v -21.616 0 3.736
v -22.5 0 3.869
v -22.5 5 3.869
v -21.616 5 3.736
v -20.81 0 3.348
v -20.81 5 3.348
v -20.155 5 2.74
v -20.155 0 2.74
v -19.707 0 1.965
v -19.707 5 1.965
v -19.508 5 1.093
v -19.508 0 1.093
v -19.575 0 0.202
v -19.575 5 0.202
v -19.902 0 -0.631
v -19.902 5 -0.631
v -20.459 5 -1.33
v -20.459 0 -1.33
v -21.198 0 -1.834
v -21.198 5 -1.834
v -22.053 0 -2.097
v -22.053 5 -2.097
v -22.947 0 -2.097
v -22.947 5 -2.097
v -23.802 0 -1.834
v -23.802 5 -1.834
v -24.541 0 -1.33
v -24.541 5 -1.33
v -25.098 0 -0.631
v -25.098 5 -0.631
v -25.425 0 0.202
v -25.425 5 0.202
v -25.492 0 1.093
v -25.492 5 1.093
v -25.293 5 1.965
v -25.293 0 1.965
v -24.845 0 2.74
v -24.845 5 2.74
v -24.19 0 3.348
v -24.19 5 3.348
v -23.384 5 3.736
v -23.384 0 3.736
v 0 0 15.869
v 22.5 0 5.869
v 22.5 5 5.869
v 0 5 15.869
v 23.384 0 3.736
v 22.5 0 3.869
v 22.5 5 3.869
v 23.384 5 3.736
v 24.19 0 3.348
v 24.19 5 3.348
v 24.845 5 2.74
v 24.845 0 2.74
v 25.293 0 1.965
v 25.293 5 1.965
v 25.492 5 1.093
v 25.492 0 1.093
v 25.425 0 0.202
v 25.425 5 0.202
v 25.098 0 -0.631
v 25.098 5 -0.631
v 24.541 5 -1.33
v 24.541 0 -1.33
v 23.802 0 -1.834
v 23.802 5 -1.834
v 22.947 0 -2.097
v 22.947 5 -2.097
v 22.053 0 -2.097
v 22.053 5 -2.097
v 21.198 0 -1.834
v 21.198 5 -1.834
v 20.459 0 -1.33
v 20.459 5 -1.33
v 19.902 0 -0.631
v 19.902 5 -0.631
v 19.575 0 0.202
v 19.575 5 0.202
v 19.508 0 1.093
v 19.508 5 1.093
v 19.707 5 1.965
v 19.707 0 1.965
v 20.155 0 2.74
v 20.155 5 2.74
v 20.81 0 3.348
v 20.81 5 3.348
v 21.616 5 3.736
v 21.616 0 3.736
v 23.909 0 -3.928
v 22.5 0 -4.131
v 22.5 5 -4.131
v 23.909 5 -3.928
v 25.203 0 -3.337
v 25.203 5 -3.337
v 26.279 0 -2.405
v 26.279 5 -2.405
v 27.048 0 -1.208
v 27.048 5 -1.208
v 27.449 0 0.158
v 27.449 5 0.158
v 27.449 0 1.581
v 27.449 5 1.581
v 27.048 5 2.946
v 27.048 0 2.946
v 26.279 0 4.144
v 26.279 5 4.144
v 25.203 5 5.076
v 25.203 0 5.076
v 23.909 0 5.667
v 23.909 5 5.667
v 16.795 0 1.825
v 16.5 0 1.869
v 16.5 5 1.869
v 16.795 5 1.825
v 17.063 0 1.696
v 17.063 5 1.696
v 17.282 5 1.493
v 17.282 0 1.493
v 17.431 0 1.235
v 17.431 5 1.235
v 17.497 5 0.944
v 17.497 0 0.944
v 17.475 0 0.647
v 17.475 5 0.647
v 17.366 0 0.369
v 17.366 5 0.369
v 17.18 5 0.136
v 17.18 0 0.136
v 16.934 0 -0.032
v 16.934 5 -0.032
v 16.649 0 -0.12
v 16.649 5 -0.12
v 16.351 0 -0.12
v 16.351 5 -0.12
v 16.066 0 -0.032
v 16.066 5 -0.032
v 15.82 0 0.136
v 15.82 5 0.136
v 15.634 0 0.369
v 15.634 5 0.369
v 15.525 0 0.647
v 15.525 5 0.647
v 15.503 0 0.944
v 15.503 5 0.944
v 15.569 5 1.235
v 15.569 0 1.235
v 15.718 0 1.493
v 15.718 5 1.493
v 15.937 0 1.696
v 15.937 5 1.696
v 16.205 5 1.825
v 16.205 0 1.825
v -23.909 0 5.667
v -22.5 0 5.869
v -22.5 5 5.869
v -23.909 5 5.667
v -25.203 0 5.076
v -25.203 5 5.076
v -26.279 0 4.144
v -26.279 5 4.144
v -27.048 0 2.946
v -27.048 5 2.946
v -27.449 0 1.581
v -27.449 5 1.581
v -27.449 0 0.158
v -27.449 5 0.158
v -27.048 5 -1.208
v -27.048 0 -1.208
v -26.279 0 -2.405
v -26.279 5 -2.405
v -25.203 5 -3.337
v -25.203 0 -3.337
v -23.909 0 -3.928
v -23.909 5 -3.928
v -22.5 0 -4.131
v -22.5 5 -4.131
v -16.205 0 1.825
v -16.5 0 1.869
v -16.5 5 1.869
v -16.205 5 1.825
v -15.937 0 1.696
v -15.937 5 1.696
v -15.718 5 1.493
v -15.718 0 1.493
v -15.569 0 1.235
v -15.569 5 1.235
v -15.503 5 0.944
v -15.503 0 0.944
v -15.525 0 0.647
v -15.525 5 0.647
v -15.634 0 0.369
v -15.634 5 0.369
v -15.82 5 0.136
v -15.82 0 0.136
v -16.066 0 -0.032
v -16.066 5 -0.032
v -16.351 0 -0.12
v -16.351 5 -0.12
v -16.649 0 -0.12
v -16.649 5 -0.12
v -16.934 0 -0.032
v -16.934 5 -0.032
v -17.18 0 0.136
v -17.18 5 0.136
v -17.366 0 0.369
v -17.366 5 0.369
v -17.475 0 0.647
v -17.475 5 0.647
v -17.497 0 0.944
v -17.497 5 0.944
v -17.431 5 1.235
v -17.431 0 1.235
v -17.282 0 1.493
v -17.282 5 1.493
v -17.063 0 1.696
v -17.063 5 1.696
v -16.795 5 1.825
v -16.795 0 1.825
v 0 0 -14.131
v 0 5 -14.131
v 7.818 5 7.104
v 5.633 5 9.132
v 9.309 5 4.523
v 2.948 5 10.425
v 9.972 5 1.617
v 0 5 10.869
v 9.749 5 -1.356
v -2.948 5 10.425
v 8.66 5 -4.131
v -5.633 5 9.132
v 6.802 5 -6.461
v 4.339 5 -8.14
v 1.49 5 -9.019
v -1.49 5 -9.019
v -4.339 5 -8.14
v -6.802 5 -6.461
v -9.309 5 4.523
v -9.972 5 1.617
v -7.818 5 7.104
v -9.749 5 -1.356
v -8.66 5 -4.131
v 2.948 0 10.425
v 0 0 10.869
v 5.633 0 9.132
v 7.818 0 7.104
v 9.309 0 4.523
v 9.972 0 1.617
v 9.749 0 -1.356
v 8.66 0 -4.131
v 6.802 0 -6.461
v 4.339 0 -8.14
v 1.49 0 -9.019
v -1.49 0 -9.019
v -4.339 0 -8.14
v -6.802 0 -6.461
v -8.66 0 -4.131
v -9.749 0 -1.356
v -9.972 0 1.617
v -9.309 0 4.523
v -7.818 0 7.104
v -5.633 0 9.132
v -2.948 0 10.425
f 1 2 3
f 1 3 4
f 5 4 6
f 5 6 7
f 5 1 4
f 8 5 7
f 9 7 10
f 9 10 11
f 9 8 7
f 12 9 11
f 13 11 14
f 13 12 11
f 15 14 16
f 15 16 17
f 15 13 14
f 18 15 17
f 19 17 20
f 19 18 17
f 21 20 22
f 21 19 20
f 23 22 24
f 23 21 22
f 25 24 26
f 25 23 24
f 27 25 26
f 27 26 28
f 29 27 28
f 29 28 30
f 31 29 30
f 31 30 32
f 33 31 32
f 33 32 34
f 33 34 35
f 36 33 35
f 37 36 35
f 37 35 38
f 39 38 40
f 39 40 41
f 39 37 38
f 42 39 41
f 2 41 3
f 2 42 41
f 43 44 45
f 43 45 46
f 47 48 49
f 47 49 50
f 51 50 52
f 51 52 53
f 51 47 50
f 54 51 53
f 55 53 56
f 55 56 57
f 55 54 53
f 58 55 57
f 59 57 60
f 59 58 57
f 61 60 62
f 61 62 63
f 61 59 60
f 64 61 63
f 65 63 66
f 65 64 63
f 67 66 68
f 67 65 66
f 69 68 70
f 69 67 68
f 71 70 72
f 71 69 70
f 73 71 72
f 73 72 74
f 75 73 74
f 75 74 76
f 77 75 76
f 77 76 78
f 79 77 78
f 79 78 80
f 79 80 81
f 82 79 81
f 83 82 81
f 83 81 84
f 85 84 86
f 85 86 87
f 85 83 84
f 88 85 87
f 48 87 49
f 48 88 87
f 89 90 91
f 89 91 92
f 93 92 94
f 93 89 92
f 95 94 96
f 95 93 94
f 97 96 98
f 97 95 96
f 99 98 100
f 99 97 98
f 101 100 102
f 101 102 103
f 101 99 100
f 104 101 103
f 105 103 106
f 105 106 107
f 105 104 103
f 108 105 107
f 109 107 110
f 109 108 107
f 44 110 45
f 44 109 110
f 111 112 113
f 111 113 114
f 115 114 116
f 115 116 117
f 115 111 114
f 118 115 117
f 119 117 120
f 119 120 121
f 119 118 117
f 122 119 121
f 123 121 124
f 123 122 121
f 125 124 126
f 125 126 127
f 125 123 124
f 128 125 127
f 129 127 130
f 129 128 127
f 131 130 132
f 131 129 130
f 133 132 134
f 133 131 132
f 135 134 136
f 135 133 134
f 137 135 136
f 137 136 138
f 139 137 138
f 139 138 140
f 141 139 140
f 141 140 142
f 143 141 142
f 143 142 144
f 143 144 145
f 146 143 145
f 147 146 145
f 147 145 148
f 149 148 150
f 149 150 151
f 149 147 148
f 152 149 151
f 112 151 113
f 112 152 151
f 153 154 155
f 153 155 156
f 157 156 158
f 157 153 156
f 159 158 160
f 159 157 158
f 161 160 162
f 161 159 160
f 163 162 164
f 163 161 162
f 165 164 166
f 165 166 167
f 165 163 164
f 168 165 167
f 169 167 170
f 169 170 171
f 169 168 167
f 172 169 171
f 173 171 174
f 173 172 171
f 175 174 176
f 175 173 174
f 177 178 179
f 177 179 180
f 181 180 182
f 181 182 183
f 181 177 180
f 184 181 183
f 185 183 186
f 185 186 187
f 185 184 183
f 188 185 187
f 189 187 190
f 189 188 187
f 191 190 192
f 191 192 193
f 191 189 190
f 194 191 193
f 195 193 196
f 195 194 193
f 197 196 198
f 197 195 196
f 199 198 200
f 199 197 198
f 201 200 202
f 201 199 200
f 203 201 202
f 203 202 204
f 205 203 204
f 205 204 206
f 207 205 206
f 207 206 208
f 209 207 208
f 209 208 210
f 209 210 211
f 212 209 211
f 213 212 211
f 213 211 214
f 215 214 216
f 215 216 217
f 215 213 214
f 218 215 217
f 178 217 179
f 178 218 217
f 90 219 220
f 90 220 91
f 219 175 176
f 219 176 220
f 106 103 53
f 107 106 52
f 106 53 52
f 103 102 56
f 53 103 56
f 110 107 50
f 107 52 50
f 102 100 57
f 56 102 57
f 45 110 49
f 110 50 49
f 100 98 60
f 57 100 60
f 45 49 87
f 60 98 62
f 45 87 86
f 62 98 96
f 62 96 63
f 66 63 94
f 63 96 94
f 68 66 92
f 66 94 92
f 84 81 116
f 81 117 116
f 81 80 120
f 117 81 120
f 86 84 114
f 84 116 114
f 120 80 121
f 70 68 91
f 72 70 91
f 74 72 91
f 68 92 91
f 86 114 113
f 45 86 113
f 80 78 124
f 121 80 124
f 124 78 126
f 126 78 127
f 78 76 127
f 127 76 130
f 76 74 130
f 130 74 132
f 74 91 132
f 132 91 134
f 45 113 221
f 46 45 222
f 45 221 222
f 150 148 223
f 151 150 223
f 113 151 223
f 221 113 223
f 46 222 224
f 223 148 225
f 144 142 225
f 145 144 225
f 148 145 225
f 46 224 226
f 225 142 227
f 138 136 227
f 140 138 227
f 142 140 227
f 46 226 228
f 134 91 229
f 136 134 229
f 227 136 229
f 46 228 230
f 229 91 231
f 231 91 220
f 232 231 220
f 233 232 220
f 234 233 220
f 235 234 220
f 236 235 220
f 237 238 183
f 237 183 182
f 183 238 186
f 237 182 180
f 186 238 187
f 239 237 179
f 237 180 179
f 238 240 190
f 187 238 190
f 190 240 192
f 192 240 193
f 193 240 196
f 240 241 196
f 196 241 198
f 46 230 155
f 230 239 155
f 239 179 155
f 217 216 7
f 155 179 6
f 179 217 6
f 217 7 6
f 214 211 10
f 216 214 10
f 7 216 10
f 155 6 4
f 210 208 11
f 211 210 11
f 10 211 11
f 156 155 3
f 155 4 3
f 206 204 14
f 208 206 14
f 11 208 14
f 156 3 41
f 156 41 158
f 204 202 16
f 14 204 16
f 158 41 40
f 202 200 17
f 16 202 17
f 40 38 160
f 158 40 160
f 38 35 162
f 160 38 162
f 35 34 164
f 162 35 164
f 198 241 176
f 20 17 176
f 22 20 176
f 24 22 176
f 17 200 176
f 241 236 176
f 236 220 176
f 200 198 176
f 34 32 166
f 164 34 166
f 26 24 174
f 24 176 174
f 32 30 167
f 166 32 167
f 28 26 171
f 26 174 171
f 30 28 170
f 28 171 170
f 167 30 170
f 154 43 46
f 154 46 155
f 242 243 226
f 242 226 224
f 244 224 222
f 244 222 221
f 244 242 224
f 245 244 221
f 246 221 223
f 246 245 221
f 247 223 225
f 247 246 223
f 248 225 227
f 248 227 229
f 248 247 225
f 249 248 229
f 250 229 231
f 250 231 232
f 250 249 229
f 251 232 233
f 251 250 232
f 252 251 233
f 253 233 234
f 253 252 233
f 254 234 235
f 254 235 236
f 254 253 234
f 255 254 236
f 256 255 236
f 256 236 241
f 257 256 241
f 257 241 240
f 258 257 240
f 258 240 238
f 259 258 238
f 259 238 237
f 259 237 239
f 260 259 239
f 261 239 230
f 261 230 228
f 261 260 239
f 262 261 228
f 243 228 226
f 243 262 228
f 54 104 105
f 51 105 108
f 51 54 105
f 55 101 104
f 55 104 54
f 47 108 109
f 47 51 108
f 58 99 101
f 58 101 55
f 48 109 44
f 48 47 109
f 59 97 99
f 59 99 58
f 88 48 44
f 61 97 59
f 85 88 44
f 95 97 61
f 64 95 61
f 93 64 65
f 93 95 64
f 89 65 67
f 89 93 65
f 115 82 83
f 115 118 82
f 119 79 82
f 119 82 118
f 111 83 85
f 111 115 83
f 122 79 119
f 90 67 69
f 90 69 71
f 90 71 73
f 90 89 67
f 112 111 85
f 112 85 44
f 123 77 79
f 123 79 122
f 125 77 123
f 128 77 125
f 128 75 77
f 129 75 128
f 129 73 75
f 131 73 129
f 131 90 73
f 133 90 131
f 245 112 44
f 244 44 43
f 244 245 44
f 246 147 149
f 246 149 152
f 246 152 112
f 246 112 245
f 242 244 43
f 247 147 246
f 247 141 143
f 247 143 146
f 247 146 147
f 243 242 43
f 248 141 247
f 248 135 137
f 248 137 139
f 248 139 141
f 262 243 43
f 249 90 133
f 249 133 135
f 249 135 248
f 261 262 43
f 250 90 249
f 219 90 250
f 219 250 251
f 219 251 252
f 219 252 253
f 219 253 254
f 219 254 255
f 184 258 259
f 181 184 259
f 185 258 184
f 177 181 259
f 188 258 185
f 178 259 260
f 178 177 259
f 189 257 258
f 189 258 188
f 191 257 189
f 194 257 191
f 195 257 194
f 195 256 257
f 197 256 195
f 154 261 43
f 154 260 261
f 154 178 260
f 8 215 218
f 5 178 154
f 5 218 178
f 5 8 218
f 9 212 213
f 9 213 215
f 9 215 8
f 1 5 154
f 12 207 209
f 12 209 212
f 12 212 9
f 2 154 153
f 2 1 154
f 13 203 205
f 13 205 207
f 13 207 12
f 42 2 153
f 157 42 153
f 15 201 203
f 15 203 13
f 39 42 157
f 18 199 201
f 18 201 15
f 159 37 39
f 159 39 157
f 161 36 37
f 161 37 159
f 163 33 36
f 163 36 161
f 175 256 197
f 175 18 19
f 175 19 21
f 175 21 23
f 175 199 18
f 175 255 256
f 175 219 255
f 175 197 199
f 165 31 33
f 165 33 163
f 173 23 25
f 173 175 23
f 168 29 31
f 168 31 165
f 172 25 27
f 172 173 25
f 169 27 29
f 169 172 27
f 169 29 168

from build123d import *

# Parameters (mm, degrees)
SKETCH_1_R      = 3
SKETCH_1_R_2    = 10
SKETCH_1_R_3    = 1
EXTRUDE_1_DEPTH = 5


with BuildPart() as part:
    # Эскиз1 → Бобышка-Вытянуть1 (new body)
    with BuildSketch(Plane(origin=(0, 0, 0), x_dir=(1, 0, 0), z_dir=(0, 1, 0))):
        with BuildLine():
            Line((-22.5, 4.130728704), (0, 14.130728704))
            Line((0, 14.130728704), (22.5, 4.130728704))
            ThreePointArc((22.5, 4.130728704), (27.5, -0.869271296), (22.5, -5.869271296))
            Line((22.5, -5.869271296), (0, -15.869271296))
            Line((0, -15.869271296), (-22.5, -5.869271296))
            ThreePointArc((-22.5, -5.869271296), (-27.5, -0.869271296), (-22.5, 4.130728704))
        make_face()
        with Locations(Location((-22.5, -0.869271296, 0), (0, 0, 270))):
            Circle(SKETCH_1_R, mode=Mode.SUBTRACT)
        with Locations(Location((0, -0.869271296, 0), (0, 0, 270))):
            Circle(SKETCH_1_R_2, mode=Mode.SUBTRACT)
        with Locations(Location((22.5, -0.869271296, 0), (0, 0, 270))):
            Circle(SKETCH_1_R, mode=Mode.SUBTRACT)
        with Locations(Location((-16.5, -0.869271296, 0), (0, 0, 270))):
            Circle(SKETCH_1_R_3, mode=Mode.SUBTRACT)
        with Locations(Location((16.5, -0.869271296, 0), (0, 0, 270))):
            Circle(SKETCH_1_R_3, mode=Mode.SUBTRACT)
    extrude(amount=EXTRUDE_1_DEPTH)


solid = part.part
